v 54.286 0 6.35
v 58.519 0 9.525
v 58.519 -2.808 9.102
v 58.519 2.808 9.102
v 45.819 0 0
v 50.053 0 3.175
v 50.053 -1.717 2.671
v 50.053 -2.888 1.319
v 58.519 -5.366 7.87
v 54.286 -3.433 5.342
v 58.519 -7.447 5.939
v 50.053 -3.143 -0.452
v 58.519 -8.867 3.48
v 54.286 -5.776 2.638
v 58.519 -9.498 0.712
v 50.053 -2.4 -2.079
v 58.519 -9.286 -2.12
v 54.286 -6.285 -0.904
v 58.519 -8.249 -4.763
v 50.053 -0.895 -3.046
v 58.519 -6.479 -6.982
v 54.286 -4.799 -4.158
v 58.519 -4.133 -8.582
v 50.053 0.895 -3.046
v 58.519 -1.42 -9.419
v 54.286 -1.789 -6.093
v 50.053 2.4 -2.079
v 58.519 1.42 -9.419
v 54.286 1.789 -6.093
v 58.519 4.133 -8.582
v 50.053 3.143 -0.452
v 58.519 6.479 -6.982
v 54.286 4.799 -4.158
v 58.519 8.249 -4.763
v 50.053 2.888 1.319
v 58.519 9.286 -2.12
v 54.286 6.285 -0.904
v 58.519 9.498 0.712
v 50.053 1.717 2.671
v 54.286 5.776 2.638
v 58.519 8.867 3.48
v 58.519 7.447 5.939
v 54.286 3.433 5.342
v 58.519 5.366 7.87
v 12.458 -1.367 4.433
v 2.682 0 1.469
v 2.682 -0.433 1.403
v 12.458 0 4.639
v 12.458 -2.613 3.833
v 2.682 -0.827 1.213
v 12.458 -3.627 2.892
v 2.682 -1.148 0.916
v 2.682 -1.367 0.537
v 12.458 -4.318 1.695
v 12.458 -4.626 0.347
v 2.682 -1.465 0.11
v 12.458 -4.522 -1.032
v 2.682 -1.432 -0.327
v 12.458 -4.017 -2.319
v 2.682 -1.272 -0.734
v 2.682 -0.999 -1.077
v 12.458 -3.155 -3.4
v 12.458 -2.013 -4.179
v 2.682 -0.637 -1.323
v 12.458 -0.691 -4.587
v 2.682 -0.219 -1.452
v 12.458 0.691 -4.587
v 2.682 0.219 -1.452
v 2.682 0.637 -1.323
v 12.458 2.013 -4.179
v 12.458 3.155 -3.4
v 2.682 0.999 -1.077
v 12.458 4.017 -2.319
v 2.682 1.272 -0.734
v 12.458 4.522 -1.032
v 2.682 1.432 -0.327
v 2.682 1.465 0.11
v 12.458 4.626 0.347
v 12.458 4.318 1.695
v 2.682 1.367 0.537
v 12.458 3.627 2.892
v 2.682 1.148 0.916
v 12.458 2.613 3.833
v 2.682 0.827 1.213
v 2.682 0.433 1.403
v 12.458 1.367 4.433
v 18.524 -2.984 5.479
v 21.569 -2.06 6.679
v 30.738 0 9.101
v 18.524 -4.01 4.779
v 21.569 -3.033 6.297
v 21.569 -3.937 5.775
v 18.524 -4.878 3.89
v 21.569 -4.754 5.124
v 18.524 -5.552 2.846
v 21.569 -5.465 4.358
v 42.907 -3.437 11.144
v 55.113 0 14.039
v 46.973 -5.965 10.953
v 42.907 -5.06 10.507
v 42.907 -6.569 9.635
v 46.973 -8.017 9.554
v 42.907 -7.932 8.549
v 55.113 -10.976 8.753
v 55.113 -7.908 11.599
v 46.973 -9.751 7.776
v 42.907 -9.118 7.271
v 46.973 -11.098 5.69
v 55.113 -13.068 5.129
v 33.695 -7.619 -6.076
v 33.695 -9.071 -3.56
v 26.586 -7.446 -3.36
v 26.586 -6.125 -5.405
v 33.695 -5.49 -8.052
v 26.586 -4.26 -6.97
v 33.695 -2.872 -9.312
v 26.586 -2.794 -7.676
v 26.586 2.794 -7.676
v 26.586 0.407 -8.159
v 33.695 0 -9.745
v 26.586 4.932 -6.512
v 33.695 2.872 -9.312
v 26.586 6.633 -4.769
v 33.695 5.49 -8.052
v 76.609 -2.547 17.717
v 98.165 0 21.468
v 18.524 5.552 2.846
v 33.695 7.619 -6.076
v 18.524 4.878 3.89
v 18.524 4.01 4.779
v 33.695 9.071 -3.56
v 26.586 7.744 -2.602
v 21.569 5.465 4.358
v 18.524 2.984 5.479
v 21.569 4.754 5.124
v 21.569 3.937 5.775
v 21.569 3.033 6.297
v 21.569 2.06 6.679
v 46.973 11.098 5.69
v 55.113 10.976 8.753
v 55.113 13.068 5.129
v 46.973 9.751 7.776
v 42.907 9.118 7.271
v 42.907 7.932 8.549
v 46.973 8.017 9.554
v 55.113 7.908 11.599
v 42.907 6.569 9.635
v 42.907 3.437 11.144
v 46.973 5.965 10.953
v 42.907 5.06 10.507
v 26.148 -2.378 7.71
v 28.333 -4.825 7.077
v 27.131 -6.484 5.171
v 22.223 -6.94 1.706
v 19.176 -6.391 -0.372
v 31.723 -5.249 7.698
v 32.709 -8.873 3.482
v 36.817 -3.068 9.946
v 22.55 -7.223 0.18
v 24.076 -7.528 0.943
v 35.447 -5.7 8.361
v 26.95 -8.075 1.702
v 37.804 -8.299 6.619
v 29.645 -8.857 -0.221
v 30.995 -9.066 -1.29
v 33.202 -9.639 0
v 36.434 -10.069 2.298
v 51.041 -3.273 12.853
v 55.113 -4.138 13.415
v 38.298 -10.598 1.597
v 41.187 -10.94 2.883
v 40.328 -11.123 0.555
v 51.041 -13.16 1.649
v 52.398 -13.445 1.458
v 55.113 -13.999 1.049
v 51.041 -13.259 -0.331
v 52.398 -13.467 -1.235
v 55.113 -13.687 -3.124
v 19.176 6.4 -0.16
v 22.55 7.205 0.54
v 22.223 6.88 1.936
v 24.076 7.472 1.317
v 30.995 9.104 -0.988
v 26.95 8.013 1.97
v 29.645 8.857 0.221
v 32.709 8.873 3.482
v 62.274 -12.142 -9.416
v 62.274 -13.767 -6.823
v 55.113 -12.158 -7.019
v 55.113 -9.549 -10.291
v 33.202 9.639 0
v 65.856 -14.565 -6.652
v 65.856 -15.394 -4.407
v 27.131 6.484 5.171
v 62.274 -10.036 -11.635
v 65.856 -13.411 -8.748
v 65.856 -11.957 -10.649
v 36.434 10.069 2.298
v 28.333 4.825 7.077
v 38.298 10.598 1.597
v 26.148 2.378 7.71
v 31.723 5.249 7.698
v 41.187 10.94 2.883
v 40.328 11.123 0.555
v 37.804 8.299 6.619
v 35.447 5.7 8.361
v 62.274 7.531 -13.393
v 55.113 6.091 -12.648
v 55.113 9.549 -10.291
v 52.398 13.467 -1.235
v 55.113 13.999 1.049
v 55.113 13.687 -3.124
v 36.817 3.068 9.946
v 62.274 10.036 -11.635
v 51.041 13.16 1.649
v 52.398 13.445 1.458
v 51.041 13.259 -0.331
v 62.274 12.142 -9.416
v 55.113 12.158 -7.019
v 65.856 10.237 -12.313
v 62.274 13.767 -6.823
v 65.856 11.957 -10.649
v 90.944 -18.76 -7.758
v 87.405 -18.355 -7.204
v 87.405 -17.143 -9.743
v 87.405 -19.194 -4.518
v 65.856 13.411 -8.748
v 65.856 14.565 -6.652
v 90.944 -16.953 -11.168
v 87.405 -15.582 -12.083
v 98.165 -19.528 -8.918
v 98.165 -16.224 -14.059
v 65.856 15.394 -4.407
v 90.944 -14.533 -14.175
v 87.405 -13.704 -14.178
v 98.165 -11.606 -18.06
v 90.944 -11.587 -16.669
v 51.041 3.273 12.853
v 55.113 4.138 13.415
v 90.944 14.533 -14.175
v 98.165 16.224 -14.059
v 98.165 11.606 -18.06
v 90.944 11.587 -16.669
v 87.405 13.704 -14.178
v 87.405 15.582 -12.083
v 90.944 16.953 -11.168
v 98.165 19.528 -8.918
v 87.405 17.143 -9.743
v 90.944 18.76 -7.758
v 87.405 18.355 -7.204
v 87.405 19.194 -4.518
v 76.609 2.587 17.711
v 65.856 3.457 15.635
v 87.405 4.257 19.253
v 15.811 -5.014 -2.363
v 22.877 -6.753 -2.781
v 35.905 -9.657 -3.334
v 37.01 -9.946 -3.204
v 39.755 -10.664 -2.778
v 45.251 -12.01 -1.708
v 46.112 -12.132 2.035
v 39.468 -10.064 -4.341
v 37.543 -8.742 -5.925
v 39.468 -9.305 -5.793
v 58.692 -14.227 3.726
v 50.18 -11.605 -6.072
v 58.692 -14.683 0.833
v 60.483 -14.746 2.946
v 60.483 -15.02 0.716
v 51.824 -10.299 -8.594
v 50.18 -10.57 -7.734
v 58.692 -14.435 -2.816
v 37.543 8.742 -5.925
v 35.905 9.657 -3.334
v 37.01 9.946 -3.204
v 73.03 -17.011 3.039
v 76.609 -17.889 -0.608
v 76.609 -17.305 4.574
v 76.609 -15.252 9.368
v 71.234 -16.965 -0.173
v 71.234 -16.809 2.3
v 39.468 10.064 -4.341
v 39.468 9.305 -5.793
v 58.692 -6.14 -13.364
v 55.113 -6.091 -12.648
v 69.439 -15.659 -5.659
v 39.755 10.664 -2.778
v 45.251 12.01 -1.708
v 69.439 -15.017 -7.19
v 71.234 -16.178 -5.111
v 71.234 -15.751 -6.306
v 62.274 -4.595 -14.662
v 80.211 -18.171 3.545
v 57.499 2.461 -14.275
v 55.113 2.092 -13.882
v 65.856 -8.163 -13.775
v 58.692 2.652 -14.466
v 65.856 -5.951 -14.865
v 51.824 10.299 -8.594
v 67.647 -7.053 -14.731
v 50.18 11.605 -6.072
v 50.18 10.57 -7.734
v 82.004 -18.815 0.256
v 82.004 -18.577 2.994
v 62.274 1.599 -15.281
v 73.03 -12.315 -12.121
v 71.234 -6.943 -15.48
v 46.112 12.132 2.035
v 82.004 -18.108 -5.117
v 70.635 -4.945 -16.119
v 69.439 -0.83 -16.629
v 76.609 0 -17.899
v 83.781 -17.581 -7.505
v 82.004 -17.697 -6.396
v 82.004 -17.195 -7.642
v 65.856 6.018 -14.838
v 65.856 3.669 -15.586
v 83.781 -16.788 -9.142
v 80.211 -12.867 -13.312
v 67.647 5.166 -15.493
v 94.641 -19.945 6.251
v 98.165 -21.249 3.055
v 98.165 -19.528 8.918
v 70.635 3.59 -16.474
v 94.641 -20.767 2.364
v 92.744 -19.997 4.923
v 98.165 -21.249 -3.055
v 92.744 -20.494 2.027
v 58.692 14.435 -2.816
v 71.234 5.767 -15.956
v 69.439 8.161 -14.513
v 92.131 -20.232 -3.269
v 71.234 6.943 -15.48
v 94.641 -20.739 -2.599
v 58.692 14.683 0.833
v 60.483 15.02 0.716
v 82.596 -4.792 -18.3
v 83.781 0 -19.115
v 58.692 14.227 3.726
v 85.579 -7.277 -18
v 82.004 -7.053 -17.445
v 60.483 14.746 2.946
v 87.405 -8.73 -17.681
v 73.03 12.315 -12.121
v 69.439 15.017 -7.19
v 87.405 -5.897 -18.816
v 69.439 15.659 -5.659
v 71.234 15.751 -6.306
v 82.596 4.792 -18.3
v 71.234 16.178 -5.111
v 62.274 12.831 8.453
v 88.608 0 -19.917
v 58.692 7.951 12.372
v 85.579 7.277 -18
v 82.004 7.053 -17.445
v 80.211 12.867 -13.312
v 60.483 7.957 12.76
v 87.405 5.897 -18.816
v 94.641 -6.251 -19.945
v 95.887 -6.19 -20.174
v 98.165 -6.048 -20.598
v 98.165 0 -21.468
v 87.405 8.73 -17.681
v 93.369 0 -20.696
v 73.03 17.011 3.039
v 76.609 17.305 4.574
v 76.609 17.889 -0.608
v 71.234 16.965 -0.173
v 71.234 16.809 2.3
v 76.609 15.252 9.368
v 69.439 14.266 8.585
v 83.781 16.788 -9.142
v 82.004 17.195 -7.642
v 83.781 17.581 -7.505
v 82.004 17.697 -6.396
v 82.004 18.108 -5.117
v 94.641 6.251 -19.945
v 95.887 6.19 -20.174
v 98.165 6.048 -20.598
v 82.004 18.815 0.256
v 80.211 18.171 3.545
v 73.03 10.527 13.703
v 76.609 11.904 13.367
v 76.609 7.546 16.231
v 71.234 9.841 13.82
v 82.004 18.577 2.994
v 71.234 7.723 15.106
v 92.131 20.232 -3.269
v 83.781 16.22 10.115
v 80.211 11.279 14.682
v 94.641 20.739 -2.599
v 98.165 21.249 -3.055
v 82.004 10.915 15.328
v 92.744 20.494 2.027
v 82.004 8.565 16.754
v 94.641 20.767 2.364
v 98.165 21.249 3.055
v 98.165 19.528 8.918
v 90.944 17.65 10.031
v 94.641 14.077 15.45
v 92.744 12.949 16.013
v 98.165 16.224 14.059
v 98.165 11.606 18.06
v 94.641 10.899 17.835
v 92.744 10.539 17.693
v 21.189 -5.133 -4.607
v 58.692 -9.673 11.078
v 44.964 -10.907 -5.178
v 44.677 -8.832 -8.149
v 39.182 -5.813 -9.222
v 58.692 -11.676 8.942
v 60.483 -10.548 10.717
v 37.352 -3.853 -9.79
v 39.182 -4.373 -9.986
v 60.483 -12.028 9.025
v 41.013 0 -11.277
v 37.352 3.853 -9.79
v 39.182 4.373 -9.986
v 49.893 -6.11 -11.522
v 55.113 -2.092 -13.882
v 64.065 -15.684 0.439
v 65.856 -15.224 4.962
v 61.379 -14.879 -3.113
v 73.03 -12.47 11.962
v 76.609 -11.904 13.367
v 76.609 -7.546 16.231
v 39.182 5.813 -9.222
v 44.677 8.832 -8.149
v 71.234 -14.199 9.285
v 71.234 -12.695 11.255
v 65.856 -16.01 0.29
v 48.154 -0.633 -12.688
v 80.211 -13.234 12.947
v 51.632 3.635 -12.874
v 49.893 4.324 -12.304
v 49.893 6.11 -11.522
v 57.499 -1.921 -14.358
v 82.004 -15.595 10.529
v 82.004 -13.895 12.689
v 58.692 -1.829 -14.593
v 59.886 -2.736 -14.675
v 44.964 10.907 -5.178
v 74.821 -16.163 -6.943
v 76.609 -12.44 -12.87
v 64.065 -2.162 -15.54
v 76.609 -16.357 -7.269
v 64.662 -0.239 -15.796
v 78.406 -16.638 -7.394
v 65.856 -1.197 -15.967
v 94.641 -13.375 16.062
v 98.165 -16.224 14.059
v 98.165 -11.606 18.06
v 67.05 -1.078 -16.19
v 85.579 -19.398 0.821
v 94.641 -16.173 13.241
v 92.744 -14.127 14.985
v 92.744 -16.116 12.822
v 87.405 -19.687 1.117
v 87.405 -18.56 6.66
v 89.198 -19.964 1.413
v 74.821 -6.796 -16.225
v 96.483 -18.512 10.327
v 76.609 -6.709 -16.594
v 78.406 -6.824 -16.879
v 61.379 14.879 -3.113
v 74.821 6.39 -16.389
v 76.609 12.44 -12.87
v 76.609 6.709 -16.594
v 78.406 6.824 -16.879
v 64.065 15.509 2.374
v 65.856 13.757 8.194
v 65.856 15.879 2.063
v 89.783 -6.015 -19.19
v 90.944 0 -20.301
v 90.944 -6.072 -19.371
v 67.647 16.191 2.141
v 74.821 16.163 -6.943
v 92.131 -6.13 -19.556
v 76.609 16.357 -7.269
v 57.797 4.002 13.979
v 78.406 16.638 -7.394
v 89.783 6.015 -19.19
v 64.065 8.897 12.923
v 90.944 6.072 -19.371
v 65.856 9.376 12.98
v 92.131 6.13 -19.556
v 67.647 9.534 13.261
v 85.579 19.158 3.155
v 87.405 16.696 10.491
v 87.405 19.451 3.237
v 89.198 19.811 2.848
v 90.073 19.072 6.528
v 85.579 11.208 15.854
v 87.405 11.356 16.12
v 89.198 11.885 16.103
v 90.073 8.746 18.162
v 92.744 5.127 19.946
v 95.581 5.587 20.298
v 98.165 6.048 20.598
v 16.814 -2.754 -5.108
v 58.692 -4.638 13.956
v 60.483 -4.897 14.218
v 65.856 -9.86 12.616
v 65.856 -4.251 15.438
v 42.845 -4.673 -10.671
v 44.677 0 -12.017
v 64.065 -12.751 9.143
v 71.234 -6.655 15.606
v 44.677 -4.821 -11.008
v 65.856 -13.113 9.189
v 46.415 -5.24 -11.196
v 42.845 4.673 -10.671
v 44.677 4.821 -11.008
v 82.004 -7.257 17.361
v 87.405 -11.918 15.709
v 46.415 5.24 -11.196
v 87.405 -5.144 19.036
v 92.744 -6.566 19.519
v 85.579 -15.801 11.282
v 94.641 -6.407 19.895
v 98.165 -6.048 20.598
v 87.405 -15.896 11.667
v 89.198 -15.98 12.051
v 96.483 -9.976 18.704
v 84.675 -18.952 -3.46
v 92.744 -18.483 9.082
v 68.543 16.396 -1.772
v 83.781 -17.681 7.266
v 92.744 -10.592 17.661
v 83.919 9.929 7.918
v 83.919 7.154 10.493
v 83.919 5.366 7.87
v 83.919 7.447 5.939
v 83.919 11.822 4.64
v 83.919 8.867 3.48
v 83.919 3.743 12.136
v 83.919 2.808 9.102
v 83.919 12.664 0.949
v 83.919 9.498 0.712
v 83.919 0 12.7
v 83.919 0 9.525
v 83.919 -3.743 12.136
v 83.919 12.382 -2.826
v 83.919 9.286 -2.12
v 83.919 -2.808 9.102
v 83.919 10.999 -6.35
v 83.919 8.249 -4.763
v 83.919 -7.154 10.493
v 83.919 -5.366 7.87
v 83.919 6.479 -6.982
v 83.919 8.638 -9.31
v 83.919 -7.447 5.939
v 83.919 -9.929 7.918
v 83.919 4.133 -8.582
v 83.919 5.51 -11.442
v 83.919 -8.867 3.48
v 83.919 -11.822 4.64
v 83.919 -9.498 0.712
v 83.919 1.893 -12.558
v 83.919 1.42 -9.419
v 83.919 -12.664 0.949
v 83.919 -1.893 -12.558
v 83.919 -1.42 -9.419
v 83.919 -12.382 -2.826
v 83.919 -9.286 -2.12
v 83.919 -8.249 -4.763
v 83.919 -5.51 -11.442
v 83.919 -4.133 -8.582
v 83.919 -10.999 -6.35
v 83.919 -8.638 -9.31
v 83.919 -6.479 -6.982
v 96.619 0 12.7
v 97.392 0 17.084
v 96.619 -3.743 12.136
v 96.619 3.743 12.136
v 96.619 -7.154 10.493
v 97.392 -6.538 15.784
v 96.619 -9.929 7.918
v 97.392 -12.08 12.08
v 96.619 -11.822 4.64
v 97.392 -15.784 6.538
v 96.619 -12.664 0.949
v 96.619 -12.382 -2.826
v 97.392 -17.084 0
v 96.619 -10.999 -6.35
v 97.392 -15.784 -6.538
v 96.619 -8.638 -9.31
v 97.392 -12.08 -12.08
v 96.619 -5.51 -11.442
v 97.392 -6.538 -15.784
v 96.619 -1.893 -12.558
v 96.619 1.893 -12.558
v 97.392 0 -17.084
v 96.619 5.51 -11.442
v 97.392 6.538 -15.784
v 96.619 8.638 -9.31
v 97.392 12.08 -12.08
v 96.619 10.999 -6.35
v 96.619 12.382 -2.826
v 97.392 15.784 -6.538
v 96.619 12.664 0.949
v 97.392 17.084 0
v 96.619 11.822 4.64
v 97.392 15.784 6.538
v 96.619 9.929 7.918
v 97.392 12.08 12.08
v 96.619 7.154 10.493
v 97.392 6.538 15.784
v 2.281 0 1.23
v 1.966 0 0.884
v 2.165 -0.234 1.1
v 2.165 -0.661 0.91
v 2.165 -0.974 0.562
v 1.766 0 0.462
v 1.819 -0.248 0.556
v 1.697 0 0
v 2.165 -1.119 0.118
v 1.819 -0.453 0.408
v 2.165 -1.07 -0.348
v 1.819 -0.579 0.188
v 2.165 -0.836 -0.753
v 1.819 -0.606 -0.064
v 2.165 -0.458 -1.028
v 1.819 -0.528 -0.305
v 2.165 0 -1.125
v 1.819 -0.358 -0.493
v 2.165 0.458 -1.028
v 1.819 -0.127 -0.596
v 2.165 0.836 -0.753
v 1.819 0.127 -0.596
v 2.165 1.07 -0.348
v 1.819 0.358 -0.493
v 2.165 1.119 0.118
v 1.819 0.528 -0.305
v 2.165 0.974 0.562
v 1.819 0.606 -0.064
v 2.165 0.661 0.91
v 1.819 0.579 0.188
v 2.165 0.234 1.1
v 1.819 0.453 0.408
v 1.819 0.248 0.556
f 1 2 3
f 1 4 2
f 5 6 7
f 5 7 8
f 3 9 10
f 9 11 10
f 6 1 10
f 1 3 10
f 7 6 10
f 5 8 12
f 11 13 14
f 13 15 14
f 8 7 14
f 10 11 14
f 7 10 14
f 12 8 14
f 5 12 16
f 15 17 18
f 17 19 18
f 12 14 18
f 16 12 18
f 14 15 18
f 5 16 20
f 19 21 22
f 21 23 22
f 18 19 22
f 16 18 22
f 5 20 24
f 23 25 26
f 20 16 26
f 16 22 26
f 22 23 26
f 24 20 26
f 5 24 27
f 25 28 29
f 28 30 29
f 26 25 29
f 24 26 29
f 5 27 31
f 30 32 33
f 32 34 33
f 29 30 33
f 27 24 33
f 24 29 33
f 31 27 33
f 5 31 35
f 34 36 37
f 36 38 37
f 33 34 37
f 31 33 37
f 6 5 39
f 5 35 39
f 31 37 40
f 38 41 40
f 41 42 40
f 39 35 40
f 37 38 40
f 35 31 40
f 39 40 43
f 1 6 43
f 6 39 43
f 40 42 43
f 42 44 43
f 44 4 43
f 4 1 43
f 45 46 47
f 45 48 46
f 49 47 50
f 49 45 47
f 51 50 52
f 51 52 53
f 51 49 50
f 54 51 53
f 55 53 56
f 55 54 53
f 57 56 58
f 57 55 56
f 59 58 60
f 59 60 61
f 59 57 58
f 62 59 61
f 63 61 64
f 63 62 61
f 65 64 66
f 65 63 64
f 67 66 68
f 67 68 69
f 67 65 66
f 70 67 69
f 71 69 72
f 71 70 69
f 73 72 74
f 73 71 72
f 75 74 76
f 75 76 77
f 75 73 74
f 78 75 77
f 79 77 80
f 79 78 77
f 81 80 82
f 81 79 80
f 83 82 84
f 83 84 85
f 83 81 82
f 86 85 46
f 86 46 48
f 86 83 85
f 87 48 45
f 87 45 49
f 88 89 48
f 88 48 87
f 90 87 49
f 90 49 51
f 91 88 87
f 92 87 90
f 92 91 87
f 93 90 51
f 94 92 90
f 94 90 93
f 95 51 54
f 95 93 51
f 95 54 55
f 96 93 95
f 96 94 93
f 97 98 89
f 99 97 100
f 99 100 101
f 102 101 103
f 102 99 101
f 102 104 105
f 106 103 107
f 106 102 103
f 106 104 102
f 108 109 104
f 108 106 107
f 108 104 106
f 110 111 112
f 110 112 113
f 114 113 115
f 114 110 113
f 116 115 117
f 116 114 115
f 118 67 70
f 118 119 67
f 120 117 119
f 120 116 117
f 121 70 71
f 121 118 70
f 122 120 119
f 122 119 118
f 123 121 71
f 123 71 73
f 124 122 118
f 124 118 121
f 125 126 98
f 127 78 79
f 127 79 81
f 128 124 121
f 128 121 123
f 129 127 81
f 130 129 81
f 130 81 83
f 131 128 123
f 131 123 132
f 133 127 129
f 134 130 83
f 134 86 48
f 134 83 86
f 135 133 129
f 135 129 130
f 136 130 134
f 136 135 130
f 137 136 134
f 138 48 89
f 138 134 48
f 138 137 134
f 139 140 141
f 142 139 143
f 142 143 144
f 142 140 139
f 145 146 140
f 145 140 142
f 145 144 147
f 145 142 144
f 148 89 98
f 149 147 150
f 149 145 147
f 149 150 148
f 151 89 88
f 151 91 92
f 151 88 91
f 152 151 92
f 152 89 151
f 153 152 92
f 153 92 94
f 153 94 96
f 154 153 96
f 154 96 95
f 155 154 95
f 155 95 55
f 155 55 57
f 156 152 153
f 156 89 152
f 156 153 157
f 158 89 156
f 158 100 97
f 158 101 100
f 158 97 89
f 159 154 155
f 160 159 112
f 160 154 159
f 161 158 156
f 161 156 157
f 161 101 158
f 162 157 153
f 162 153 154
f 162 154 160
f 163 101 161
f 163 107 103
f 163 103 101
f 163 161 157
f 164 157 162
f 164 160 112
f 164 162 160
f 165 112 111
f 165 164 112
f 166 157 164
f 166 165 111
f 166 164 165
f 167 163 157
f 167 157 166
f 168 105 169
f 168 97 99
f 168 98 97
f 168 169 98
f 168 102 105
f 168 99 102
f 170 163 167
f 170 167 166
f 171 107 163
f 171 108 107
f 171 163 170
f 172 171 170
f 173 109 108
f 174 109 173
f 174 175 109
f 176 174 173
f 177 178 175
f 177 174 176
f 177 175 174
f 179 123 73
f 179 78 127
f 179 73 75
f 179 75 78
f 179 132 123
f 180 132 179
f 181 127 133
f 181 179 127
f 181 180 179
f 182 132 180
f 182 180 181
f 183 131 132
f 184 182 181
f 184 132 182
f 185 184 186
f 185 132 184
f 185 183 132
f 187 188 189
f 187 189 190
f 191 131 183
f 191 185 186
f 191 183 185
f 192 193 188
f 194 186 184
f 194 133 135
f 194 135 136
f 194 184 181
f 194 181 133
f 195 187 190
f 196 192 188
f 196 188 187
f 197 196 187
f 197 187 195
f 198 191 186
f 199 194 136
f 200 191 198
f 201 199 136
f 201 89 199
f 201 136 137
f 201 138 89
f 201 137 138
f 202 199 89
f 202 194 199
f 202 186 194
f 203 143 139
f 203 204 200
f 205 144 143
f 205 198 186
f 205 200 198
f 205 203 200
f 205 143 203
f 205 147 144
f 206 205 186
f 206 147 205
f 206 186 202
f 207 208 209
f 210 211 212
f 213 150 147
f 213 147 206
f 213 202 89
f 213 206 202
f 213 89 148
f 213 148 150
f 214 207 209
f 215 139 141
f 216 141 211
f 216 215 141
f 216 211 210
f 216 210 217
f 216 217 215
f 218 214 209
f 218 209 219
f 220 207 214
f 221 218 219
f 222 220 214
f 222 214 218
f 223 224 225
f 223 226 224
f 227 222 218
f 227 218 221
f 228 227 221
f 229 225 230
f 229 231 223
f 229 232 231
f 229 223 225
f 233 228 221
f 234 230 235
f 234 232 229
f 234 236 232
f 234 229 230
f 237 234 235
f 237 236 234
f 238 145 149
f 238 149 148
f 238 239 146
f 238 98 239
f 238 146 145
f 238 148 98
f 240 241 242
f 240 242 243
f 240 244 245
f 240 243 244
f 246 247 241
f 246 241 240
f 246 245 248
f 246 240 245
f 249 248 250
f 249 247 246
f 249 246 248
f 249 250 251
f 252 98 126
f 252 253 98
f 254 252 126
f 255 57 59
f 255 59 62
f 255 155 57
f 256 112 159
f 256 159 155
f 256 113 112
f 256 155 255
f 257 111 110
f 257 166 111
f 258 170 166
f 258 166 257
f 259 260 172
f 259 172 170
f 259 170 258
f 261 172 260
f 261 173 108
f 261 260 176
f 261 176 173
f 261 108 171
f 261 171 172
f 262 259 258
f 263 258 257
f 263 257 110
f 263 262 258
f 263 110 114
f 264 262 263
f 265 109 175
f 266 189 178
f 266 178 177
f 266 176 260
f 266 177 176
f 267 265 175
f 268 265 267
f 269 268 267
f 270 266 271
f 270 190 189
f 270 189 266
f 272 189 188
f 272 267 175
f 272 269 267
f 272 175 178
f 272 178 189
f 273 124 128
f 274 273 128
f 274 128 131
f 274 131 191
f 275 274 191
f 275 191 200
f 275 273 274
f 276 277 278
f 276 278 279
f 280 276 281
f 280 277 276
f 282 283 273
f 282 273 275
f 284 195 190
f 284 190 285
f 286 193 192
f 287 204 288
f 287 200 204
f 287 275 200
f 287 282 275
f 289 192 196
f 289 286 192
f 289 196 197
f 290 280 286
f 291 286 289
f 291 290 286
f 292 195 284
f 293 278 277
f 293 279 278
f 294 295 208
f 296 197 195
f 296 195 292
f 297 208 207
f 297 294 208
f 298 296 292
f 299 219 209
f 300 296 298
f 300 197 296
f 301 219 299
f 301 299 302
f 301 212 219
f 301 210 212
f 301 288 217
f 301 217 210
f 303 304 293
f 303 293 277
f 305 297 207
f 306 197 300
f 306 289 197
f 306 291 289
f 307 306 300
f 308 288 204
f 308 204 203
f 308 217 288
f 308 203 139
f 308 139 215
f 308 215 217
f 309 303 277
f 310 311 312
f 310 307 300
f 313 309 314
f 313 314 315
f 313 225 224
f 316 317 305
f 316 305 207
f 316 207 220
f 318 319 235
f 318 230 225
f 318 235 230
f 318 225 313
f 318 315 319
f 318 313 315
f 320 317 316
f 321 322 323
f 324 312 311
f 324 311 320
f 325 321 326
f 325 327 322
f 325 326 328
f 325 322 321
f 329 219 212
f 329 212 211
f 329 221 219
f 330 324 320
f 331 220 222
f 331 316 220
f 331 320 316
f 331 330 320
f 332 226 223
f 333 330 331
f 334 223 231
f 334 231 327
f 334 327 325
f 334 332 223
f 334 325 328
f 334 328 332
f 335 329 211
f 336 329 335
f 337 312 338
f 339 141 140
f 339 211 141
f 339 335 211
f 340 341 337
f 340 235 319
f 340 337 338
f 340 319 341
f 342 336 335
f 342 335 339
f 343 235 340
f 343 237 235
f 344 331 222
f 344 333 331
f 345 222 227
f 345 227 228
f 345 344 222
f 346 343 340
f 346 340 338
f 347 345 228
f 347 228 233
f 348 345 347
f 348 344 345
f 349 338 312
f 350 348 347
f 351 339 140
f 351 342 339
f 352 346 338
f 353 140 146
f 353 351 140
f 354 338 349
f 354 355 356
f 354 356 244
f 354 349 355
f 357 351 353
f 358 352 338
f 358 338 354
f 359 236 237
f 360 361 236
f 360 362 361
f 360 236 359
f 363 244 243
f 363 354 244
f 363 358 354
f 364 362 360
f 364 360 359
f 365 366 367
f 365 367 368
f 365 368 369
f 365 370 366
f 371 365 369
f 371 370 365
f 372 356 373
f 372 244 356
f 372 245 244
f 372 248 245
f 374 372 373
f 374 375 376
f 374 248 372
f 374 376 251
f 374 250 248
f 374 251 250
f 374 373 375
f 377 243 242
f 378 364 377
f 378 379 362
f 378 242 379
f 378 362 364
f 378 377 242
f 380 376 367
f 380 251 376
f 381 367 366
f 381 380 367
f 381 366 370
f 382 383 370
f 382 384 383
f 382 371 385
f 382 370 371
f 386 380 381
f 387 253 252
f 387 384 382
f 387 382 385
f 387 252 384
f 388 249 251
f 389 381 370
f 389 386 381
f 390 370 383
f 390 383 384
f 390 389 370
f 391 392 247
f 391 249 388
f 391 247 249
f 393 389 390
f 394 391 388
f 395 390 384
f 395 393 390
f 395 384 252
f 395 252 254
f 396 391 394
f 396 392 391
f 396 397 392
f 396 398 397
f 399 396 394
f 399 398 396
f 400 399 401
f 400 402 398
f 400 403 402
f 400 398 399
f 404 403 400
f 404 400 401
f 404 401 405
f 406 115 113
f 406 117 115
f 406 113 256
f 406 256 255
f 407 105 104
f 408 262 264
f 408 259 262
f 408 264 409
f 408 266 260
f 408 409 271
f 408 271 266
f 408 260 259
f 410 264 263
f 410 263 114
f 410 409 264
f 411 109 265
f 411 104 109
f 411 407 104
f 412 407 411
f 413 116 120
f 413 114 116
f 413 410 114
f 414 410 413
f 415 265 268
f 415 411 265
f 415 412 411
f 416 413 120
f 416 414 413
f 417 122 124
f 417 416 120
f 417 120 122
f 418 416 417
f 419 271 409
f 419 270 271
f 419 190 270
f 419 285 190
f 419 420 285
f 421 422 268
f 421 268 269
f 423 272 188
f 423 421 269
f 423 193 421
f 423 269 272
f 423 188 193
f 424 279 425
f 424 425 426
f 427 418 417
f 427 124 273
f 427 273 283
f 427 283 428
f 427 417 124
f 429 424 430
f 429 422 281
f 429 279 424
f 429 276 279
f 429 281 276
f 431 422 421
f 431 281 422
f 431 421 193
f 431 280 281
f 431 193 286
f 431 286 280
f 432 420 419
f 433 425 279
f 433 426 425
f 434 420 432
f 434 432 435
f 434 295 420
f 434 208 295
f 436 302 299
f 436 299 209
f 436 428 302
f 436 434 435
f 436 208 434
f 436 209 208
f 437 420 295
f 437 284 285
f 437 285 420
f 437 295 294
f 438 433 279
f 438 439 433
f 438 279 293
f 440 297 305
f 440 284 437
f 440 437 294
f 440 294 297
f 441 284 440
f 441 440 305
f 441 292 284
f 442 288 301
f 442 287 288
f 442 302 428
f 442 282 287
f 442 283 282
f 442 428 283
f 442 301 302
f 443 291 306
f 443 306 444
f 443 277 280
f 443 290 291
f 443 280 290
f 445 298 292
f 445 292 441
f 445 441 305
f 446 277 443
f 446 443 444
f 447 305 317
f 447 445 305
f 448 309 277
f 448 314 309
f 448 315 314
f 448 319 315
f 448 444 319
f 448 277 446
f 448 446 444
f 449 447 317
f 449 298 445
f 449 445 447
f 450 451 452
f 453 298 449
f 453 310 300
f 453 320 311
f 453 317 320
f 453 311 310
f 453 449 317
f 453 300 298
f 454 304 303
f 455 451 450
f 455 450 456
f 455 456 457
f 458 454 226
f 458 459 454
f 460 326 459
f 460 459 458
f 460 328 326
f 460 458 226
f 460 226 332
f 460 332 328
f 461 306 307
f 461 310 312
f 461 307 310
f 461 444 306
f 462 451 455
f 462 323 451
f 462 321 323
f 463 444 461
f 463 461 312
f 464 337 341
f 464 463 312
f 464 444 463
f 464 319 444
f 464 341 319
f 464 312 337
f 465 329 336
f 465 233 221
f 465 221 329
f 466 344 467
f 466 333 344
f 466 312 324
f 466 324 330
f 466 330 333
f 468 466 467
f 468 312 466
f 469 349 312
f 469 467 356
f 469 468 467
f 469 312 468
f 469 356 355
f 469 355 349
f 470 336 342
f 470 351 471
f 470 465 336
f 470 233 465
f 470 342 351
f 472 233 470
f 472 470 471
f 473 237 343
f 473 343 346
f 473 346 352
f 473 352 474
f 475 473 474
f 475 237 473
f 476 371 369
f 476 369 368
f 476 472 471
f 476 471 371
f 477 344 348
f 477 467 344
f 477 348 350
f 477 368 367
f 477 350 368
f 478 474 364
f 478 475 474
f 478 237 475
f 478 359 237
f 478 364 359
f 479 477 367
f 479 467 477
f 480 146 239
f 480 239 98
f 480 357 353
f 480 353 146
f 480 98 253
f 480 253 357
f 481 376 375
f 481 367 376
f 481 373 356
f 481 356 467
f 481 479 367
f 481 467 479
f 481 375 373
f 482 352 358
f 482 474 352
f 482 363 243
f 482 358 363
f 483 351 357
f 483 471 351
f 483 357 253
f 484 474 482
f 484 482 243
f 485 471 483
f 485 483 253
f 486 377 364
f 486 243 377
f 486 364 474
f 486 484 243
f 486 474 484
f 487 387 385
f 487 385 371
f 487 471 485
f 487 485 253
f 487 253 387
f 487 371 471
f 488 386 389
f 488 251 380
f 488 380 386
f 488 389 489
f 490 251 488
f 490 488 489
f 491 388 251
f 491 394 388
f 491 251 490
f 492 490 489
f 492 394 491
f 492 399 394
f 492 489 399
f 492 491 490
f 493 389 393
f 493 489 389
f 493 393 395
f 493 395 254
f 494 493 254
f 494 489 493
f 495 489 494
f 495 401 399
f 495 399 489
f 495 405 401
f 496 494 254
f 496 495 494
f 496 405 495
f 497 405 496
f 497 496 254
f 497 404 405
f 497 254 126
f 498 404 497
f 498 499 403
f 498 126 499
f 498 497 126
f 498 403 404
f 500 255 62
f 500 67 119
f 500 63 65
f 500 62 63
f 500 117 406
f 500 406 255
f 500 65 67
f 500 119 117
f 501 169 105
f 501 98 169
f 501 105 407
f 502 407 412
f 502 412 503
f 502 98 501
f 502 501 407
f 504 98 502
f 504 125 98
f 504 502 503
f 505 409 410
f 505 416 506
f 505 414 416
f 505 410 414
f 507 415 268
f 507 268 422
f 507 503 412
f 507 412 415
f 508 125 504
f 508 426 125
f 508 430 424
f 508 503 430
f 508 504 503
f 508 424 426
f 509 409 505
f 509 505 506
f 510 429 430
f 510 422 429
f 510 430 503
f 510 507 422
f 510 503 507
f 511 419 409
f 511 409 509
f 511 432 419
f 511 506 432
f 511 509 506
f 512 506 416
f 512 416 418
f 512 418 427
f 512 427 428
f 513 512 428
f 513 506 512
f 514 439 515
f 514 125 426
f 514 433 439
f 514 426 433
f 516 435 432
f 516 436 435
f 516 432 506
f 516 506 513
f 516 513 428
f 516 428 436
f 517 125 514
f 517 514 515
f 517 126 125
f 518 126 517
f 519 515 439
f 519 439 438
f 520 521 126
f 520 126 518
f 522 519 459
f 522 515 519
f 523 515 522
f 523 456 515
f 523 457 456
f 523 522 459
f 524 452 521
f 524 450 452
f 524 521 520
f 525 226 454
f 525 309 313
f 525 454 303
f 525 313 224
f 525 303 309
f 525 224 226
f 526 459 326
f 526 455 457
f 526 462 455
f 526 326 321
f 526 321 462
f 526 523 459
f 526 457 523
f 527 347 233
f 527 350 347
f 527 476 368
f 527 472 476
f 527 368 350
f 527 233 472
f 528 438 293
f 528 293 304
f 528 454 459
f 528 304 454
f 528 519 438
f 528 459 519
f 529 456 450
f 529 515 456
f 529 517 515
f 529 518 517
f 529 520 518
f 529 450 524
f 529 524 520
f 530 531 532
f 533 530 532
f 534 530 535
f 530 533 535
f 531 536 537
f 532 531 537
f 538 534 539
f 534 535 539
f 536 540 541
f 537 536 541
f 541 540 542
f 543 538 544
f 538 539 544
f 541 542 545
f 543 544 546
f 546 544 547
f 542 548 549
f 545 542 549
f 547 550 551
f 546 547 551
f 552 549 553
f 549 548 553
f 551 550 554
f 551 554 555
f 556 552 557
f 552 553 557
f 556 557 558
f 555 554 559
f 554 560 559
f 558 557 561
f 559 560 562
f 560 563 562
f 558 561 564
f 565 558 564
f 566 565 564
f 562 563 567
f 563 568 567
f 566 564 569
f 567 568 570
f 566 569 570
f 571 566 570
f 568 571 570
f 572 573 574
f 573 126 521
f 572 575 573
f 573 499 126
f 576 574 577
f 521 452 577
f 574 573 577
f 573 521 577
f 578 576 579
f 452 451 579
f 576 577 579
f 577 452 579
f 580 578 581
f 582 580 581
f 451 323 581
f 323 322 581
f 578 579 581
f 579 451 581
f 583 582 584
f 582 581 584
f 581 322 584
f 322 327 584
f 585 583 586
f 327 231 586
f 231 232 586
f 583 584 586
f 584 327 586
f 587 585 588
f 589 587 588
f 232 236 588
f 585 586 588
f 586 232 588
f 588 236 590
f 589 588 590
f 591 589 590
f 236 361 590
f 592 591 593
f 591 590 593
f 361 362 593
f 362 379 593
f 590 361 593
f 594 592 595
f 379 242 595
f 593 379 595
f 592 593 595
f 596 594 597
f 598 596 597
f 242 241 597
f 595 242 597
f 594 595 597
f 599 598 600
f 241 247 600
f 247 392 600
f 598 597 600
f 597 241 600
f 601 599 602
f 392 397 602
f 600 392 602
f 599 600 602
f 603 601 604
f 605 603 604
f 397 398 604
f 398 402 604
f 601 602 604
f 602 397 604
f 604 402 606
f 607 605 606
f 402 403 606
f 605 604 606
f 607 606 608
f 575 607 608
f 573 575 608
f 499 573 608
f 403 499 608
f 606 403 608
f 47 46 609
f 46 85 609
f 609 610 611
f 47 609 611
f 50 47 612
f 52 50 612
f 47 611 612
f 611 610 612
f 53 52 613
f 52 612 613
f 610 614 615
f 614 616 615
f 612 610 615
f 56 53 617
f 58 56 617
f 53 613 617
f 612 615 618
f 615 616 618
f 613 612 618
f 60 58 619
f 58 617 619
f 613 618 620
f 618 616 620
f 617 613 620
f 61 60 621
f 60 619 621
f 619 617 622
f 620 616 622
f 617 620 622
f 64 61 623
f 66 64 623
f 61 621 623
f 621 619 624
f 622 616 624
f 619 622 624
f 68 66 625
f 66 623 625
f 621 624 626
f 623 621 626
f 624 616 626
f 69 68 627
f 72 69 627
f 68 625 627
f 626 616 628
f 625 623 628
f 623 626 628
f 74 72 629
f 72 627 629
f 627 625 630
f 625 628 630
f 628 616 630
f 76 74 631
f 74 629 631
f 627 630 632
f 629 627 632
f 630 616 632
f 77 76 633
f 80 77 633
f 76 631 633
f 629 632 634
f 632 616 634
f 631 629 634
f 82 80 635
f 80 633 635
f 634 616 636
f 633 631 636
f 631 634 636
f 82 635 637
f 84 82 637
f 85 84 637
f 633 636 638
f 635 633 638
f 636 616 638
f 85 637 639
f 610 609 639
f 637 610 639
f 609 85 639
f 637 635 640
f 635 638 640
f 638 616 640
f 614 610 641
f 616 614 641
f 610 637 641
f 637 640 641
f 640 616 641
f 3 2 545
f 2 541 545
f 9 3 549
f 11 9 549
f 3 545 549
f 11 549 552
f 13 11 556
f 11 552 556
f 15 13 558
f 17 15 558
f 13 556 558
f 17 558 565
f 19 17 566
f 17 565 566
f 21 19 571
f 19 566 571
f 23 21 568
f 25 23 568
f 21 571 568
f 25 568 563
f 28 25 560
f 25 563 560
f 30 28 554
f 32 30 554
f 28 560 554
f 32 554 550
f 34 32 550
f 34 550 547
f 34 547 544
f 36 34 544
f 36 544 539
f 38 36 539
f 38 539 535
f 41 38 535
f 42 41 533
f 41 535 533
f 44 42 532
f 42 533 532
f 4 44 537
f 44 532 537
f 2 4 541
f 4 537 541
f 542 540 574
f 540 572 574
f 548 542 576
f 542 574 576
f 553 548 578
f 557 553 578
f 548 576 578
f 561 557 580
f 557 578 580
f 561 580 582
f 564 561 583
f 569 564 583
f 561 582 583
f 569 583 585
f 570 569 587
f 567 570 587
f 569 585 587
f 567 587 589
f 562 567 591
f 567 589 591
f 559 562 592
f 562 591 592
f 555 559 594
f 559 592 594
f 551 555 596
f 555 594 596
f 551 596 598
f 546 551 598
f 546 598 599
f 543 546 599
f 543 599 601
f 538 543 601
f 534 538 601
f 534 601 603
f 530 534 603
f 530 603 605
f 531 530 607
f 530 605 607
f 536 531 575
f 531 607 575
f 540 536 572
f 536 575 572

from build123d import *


with BuildPart() as part:
    # Sketch1 → Revolve2 (revolve)
    with BuildSketch(Plane(origin=(0, 0, 0), x_dir=(1, 0, 0), z_dir=(0, 1, 0)), mode=Mode.PRIVATE) as revolve2_sk:
        with BuildLine():
            Line((1.697321091, 0), (45.819405393, 0))
            Line((45.819405393, 0), (58.519405393, 9.525))
            Line((58.519405393, 9.525), (83.919405393, 9.525))
            Line((83.919405393, 9.525), (83.919405393, 12.7))
            Line((83.919405393, 12.7), (96.619405393, 12.7))
            Line((96.619405393, 12.7), (98.165428581, 21.4679332))
            add(Edge.make_bspline(
                [(2.682127148, 1.468644362), (2.982092127, 1.591742283), (3.982765764, 1.986976913), (6.075542743, 2.735585346), (9.959285205, 3.961402854), (15.35260807, 5.458934046), (21.847317263, 7.086678944), (29.055363889, 8.749177841), (36.286920774, 10.313744718), (43.531901048, 11.801111844), (50.793776988, 13.226984496), (58.058153921, 14.599266319), (64.433980883, 15.762645369), (69.883896781, 16.732062359), (74.459068804, 17.529825957), (78.065425347, 18.150661812), (81.784961377, 18.781283529), (85.307065103, 19.372441088), (89.168740248, 20.010357493), (92.45838759, 20.54964543), (95.664328261, 21.067043036), (97.333372349, 21.334925019), (98.164963492, 21.467858845), (98.165428581, 21.4679332)],
                knots=[0.027847292, 0.027847292, 0.027847292, 0.027847292, 0.027847292, 0.039565322, 0.06672611, 0.108155752, 0.174993972, 0.2418322, 0.308670423, 0.375508647, 0.442346873, 0.509185099, 0.576023325, 0.642861549, 0.676280662, 0.709699776, 0.743118888, 0.776538001, 0.809957114, 0.843376227, 0.87679534, 0.910214452, 0.910233153, 0.910233153, 0.910233153, 0.910233153, 0.910233153], degree=4))
            ThreePointArc((2.682127148, 1.468644362), (1.966311917, 0.884132234), (1.697321091, 0))
        make_face()
    revolve(revolve2_sk.sketch.rotate(Axis((0, 0, 0), (1, 0, 0)), 180), axis=Axis((0, 0, 0), (1, 0, 0)))


solid = part.part
